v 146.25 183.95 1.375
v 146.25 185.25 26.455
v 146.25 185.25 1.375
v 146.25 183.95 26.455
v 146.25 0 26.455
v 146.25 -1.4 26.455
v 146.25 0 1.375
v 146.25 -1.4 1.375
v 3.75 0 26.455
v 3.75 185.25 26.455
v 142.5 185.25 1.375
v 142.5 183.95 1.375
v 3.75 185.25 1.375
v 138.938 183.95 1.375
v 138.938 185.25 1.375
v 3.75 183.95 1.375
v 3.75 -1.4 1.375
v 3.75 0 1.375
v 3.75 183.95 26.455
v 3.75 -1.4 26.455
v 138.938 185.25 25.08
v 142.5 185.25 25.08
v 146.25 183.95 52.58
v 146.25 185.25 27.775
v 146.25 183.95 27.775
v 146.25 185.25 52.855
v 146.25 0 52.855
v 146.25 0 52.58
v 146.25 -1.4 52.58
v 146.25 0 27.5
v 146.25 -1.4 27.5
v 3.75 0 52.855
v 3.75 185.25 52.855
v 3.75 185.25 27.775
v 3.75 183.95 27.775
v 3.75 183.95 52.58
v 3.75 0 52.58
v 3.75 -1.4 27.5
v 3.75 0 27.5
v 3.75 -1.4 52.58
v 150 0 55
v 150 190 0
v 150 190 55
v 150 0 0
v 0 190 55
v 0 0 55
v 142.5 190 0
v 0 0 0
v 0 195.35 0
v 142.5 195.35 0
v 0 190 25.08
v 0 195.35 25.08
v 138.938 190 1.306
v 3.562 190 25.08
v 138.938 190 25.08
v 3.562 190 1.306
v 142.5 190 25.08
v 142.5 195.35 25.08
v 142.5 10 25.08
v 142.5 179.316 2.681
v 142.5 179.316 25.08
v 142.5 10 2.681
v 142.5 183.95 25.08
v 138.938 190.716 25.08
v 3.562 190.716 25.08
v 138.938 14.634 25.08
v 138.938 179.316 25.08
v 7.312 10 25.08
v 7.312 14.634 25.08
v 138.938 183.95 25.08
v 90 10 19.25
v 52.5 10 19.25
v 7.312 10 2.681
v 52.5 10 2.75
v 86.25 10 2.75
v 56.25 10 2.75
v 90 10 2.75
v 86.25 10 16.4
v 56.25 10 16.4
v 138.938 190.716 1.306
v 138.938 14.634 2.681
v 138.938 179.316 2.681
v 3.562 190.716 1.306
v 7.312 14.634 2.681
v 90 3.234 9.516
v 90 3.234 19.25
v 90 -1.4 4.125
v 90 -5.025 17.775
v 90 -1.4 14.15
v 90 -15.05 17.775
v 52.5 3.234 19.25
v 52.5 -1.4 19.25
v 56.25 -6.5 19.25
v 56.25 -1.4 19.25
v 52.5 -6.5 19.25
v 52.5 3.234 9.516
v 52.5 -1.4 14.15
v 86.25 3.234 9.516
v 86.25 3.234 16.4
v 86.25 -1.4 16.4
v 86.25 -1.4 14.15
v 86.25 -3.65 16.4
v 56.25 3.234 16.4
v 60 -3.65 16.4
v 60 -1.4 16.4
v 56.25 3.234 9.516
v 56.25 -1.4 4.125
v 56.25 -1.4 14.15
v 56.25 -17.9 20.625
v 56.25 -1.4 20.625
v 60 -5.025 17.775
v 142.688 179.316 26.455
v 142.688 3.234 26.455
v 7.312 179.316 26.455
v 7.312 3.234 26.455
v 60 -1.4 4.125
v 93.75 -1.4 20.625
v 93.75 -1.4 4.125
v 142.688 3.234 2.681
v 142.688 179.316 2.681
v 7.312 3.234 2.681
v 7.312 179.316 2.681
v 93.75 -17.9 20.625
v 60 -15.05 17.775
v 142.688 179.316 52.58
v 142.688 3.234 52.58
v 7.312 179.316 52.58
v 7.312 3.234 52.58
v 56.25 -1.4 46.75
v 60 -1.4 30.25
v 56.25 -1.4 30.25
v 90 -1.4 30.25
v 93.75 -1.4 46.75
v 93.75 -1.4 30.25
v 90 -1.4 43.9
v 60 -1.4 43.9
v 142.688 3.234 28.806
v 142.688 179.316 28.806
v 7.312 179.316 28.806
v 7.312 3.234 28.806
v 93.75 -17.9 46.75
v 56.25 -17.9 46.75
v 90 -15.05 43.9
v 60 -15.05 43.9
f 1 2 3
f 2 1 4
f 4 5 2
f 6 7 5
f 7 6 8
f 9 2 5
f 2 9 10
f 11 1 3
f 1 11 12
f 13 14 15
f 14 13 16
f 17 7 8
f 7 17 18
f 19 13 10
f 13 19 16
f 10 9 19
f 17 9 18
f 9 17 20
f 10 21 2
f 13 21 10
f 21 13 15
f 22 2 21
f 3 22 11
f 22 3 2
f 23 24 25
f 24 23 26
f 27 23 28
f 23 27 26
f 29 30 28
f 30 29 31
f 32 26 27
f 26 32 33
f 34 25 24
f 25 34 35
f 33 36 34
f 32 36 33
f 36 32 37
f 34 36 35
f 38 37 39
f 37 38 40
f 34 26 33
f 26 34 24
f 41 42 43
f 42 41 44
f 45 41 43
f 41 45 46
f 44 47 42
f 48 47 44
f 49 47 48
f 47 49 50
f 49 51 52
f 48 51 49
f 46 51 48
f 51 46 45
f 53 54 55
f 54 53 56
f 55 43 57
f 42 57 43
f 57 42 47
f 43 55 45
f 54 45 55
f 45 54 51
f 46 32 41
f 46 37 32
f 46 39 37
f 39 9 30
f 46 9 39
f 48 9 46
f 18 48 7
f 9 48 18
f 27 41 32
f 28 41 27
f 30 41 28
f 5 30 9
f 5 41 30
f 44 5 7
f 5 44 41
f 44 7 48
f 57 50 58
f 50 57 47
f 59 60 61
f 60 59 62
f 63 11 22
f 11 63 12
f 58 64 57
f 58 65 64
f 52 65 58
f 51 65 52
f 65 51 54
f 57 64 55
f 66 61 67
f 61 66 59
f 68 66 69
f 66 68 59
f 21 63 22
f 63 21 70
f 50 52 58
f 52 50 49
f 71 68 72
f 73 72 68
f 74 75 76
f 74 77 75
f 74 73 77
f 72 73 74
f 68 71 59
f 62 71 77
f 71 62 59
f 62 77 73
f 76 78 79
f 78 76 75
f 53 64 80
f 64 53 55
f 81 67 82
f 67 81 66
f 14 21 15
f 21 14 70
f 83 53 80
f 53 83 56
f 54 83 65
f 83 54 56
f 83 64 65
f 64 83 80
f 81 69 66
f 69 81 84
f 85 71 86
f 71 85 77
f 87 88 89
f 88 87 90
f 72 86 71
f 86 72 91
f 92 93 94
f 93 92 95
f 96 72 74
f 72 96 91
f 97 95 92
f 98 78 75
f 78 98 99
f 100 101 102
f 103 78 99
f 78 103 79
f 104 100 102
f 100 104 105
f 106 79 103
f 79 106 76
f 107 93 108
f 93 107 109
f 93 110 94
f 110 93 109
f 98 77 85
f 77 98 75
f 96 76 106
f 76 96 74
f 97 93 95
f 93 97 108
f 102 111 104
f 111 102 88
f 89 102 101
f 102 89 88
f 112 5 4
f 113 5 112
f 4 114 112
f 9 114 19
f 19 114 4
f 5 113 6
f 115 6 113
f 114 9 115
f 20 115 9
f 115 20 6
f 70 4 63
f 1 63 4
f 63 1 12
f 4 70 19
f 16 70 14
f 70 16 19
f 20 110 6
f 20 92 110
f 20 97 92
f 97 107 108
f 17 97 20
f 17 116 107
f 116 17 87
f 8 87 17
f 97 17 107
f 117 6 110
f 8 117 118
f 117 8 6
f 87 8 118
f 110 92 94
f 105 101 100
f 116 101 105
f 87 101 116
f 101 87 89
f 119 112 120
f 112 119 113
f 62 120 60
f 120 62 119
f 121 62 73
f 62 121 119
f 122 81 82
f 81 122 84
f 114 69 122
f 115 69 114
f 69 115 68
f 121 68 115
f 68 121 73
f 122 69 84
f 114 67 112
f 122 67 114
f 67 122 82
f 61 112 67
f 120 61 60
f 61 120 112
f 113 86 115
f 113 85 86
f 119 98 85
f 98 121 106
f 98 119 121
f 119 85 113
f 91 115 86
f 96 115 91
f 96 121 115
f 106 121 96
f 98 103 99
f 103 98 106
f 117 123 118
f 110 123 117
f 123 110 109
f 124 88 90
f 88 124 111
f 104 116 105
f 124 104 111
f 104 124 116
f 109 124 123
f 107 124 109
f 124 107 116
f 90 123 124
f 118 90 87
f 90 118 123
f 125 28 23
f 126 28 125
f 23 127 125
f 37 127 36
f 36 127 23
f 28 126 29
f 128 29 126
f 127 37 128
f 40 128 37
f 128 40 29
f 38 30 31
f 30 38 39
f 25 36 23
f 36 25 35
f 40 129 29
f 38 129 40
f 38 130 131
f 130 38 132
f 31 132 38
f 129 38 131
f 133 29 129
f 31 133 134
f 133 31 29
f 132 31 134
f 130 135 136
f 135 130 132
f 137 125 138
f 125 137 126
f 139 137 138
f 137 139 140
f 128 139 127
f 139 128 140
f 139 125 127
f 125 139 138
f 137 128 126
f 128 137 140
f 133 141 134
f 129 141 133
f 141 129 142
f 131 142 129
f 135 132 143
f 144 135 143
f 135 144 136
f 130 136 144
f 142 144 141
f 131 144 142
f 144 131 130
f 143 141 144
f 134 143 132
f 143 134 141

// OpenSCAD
// file: case.scad
$fn=10;

width = 150;
length = 190;
heighth = 55;

module drawer_case(width, length, heighth){
	difference(){
		cube([width, length, heighth]);
		translate([(width*.05)/2,-.1,(heighth*.05)/2]){
			scale([1,1,.48]){
				cube([width-(width*.05),length-(length*.025)+.1,heighth-(heighth*.05)]);
				translate([0,0,heighth]){
					cube([width-(width*.05),length-(length*.025)+.1,heighth-(heighth*.05)]);
				}
			}
		}
	}
}

module drawer_shell(width, length, heighth){
	d_width = width-(width*.05);
	d_length = length-(length*.025)+.1;
	d_heighth = heighth-(heighth*.05);
	difference(){
		scale([1,1,.48]){
			cube([d_width, d_length, d_heighth]);
		}
		translate([(d_width*.05)/2,(d_length*.025),(d_heighth*.05)/2]){
			scale([.95,.95,.95]){
				cube([d_width, d_length,d_heighth*.48]);
			}
		}
	}
}

module drawer_handle(width,length,heighth){
	difference(){
		difference(){	
			cube([width*.25,length*.10,heighth*.30]);
			translate([width*.025,-.1,-.1]){
				cube([width*.20,length*.20,heighth*.25]);
			}
		}
		translate([-2,length*.10,0]){
			rotate([135,0,0]){
				cube([width,length*.15,heighth*.30]);
			}
		}
	}

}

module drawer(width,length,heighth){
	translate([0,10,0]){
		drawer_shell(width,length,heighth);
		translate([width*.35,-length*.10,heighth*.05]){
			drawer_handle(width,length,heighth);
		}
	}
}




drawer_case(width,length,heighth);
translate([(width*.05)/2,-length*.06,]){
	translate([0,0,(heighth*.05)/2]){
		drawer(width,length,heighth);
	}
	translate([0,0,heighth-(heighth*.5)]){
		drawer(width,length,heighth);
	}
}
//translate([width+2,0,0]){
//	drawer_shell(width,length,heighth);
//}
//
//translate([width*2,0,0]){
//	drawer_handle(width,length,heighth);
//}

	
// main file
include <case.scad>

$fn = 100;

width = 150;
length = 190;
heighth = 55;

drawer(width,length,heighth);
